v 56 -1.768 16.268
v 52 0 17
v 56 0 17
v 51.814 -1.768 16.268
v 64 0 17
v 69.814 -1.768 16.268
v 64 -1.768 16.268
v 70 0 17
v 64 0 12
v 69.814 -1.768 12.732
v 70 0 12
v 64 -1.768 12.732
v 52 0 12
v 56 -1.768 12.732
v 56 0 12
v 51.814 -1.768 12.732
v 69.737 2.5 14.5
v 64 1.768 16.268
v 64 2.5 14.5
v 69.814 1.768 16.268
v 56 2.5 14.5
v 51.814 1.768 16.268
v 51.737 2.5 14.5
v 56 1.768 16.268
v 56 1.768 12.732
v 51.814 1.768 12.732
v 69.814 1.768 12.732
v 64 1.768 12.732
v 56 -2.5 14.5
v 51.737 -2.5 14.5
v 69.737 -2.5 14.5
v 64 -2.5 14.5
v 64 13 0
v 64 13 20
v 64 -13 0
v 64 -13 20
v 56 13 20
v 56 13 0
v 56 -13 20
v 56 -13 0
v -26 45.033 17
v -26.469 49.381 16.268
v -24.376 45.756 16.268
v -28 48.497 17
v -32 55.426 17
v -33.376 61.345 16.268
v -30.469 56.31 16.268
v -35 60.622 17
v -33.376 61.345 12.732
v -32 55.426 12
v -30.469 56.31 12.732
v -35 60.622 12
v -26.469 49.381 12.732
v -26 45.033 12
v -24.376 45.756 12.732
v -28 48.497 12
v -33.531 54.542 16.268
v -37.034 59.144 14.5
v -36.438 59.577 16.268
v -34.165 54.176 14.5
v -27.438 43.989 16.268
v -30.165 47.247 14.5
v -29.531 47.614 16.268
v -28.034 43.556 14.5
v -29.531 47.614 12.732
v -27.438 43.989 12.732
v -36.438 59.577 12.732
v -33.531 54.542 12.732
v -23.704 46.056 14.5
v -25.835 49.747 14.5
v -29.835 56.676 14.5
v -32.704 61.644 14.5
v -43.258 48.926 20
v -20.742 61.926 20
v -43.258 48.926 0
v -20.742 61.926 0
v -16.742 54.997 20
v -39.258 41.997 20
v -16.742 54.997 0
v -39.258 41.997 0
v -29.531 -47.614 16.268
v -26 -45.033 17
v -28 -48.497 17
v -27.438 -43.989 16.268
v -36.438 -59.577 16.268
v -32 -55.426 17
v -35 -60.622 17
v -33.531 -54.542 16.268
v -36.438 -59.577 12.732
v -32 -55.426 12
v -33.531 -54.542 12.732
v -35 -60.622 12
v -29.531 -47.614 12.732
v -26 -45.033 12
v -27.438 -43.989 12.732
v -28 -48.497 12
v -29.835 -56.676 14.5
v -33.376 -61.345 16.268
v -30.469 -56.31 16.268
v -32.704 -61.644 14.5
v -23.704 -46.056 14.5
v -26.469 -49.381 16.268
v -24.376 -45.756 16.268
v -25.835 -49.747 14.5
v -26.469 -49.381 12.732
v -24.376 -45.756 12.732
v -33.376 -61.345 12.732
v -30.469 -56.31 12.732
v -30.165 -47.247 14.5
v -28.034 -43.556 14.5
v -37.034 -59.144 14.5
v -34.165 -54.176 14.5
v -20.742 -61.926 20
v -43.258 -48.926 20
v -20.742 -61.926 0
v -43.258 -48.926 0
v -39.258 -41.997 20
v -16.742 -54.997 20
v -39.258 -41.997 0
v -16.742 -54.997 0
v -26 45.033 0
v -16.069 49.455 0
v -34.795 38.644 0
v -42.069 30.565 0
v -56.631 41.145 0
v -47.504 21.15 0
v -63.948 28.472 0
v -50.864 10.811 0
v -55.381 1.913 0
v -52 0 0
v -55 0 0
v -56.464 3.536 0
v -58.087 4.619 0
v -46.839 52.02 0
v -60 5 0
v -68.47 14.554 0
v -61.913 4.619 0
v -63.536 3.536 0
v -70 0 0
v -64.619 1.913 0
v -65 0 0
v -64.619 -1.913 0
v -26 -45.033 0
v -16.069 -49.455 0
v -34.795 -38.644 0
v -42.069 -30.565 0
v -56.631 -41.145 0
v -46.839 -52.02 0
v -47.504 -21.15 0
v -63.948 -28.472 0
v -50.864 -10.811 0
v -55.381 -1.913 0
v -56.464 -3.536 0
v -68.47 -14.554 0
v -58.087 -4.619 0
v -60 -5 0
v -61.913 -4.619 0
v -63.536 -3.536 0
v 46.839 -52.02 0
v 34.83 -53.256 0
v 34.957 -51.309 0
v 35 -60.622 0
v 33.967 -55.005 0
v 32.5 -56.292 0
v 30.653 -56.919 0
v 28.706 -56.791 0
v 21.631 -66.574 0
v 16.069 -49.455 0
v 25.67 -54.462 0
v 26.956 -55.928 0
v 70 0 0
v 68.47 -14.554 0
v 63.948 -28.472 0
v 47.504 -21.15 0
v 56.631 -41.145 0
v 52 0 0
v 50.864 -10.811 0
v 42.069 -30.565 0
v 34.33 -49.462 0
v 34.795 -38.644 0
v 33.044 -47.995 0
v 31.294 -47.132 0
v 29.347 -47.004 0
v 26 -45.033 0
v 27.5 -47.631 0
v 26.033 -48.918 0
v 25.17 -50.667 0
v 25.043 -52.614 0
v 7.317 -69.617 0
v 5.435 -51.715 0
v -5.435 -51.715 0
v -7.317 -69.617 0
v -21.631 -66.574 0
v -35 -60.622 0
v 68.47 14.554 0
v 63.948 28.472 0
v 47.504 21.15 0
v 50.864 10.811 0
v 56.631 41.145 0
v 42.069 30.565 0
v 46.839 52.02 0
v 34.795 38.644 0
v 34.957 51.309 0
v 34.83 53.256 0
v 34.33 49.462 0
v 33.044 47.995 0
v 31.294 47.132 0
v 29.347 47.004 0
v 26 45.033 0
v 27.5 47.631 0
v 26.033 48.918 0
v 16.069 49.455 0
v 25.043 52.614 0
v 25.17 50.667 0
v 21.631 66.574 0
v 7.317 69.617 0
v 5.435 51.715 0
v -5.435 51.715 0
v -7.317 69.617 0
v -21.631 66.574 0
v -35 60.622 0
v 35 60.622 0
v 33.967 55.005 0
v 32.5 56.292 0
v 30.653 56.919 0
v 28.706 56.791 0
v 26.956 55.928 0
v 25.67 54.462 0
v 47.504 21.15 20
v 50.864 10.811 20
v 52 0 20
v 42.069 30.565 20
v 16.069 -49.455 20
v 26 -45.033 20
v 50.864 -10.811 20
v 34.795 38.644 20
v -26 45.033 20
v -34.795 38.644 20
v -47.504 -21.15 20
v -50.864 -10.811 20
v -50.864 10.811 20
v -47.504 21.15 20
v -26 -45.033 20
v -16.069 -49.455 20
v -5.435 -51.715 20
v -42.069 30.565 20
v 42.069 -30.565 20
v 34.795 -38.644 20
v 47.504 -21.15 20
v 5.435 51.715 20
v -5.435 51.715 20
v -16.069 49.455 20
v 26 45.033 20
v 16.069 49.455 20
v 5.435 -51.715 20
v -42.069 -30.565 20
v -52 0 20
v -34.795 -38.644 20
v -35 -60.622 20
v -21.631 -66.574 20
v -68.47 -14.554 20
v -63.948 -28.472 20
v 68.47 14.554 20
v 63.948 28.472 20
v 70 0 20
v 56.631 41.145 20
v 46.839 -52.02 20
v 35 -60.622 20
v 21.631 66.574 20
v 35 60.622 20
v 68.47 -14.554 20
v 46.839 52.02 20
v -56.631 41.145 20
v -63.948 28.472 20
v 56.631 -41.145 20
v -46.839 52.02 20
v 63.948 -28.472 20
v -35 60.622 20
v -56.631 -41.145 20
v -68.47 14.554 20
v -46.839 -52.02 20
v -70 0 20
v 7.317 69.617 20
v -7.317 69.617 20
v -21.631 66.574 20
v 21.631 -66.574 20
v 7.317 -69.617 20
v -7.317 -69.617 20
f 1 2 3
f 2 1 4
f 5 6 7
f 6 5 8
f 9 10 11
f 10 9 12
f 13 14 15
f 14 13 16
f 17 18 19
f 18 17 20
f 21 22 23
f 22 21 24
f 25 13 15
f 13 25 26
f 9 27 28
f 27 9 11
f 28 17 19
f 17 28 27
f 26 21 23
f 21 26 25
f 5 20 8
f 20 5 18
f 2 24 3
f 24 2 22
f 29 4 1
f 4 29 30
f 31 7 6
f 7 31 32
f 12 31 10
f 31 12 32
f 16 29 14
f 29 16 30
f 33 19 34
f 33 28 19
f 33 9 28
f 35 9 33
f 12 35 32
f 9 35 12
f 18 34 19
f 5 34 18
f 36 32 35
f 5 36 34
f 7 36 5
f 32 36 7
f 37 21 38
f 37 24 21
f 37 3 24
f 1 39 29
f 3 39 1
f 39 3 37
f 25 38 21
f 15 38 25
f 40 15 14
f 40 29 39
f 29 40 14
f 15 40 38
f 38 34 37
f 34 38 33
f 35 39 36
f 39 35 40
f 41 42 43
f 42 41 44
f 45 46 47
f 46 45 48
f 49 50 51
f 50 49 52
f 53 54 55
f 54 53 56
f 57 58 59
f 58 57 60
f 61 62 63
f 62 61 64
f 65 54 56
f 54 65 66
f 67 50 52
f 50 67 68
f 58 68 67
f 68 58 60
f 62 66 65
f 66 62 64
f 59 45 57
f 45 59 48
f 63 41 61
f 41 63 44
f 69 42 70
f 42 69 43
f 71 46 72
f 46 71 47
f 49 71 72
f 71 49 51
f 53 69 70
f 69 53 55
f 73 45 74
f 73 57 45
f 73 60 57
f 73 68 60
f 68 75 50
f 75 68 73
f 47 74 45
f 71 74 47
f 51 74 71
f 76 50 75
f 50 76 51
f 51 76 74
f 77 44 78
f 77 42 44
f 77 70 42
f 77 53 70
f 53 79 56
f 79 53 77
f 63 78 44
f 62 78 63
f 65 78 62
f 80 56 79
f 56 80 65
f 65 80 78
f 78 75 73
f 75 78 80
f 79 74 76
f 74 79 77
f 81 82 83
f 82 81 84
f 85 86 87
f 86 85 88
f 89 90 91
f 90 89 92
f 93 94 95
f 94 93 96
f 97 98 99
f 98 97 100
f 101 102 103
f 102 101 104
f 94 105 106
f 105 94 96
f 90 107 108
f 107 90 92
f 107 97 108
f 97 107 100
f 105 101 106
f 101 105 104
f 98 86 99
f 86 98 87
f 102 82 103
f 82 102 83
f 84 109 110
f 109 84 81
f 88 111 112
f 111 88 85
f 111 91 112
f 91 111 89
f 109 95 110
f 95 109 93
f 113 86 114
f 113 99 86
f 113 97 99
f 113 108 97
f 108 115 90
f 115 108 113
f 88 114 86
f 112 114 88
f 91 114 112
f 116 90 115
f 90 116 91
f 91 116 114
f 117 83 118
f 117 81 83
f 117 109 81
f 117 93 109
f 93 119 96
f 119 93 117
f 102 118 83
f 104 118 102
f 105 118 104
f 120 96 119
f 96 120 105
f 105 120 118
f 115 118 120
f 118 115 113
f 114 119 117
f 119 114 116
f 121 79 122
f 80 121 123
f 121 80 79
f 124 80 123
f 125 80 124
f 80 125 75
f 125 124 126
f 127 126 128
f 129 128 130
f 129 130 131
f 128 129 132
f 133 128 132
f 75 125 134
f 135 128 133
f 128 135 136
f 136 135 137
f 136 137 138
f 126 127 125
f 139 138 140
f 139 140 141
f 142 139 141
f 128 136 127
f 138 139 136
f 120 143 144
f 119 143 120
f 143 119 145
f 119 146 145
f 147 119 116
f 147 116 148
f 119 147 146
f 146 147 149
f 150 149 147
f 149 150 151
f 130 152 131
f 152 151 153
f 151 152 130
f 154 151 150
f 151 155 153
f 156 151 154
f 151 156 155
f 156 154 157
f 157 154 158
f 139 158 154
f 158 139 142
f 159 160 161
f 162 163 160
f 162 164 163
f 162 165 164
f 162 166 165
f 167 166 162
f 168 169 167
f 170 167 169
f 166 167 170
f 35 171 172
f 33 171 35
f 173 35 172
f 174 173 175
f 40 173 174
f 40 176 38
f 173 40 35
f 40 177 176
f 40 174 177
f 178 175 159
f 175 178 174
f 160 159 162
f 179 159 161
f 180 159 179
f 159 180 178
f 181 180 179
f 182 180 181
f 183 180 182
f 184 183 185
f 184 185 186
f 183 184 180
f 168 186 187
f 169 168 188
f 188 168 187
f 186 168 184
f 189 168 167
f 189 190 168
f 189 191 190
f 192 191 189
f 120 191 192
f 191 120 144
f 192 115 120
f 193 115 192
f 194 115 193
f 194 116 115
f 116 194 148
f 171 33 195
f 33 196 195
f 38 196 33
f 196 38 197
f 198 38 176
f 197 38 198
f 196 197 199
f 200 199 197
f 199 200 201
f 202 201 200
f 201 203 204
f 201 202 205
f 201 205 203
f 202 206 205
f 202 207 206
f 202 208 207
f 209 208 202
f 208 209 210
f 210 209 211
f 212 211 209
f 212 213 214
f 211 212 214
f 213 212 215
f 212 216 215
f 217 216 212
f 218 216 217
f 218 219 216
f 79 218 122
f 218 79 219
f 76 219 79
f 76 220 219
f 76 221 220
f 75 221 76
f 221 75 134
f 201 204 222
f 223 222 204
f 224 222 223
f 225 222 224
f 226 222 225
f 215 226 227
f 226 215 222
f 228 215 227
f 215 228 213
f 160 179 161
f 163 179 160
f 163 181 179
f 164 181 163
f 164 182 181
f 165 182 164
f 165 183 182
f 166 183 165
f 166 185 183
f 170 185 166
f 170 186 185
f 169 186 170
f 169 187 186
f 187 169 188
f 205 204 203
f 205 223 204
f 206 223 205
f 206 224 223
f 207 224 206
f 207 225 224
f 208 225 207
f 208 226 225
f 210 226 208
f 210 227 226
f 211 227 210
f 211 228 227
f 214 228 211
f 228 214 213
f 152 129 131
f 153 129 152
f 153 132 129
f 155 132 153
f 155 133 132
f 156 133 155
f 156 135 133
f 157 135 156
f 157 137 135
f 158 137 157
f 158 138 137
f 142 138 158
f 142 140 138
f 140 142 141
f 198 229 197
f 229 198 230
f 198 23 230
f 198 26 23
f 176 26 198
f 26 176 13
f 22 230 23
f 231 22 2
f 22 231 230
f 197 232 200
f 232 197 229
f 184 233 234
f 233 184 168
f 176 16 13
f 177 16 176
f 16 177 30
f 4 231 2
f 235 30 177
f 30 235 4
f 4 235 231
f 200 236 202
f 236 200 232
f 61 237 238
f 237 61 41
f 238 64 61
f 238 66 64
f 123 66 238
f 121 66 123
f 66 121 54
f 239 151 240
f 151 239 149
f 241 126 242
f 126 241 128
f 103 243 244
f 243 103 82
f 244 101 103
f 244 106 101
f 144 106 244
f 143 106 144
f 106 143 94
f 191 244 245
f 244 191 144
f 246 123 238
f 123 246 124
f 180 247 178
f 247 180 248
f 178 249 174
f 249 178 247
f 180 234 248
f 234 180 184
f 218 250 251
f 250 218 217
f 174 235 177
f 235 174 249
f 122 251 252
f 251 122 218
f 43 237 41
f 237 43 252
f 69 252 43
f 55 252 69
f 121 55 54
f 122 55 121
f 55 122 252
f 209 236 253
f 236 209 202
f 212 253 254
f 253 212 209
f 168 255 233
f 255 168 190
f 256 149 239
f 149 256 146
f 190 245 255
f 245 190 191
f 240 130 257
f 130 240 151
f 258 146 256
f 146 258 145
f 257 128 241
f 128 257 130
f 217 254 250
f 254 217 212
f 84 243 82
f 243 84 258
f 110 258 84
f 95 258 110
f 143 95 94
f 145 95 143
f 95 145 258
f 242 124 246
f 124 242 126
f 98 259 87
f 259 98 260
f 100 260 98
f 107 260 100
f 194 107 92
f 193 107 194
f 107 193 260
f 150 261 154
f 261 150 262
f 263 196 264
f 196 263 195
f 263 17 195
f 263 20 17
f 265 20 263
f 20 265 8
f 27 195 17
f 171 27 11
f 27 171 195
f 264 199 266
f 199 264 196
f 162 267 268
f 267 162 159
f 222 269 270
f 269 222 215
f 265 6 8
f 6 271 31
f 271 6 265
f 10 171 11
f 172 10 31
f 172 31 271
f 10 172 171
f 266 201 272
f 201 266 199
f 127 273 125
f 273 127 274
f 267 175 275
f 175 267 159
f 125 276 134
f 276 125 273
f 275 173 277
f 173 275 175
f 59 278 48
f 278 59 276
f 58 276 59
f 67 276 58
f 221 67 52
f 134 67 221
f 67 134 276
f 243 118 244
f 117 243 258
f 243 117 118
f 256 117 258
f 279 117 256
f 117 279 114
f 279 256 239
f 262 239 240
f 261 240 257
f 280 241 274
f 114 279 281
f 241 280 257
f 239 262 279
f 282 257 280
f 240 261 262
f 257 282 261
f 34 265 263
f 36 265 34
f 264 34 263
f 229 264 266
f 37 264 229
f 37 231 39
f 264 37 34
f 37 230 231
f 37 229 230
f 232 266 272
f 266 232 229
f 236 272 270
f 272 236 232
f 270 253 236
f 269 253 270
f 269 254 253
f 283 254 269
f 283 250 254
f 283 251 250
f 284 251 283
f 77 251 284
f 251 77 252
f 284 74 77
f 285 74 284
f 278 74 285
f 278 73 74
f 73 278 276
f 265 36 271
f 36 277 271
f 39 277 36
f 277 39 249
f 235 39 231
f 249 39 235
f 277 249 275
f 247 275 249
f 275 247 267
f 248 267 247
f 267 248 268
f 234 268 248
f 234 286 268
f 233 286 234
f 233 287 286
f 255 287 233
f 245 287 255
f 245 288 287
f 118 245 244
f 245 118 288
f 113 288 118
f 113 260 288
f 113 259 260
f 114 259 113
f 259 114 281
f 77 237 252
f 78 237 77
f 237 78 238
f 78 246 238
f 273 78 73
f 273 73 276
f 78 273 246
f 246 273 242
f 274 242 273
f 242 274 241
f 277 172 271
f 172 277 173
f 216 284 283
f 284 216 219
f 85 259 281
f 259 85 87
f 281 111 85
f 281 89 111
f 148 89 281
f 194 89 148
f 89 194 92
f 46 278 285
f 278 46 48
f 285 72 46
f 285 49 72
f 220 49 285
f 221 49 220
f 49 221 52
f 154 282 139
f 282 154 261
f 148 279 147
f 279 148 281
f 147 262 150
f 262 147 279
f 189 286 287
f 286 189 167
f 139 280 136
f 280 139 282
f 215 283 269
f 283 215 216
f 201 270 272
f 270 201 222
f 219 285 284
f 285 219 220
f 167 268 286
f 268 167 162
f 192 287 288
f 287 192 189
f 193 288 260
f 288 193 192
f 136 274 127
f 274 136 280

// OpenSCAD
// // some defaults for testing
// jogwheel_mid_rad = 70;
//
// spring_OD = 8;
// spring_len = 20;
// spring_comp_factor = 0.8;
//
// clearance = 1;



module jogwheel_mid(mid_params) {

    mid_outer_rad = mid_params[0];
    mid_width = mid_params[1];
    mid_height = mid_params[2];
    spring_params = mid_params[3];
    bearing_params = mid_params[4];
    clearances = mid_params[5];

    mid_inner_rad = mid_outer_rad - mid_width;

    spring_rad_offset = spring_params[0];
    spring_dims = spring_params[2];
    spring_comp_factor = spring_params[3];

    spring_OD = spring_dims[1];
    spring_len = spring_dims[2];

    inner_bear_rad_offset = bearing_params[2];
    inner_bear_vert_offset = bearing_params[3];
    bearing_dims = bearing_params[4];
    screw_length = bearing_params[5];
    bearing_shaft = bearing_dims[0];

    clearance = clearances[0];
    spring_diff = clearances[2];

    difference() {

        cylinder(r=mid_outer_rad, h=mid_height);        
        union() {
            // cutouts for bearings
            for (i = [0:2]) {
                rotate([0,0,i*120])
                    translate([inner_bear_rad_offset, 0, inner_bear_vert_offset])
                    union() {
                        rotate([0,90,0])
                            union() {
                                cylinder(d=bearing_shaft, h=screw_length, center=true);
                            }
                        cube([8,26,30], center=true);
                    }
            }

            //cutouts for springs
            for (i = [0:2]) {
                rotate([0,0,60+i*120])
                    translate([0, 0, -clearance]) 
                    translate([spring_rad_offset, 0, 0]) 
                    cylinder(d=spring_OD+2*clearance, h=spring_len*spring_comp_factor-spring_diff);
            }

            // cutout in centre
            translate([0,0,-clearance])
                cylinder(r=mid_inner_rad, h=mid_height+2*clearance);
        }
    }
            // for (i = [0:2]) {
            //     rotate([0,0,60+i*120])
            //         translate([0, 0, -clearance]) 
            //         translate([spring_rad_offset, 0, 0]) 
            //         cylinder(d=spring_OD+2*clearance, h=spring_len*spring_comp_factor);
            // }
}

// set up input params for test module

// mid_outer_rad = jogwheel_mid_rad;
// mid_width = 22;
// mid_height = 20;

// mid_params = [mid_outer_rad, mid_width, mid_height, spring_params, bearing_params, clearances];
mid_params = [70, 18, 20, [60,4.5,[6,8,20,0.8], 0.8], [91,16.5, 60, 14.5, [5,23,7], 21], [1,5]];

jogwheel_mid(mid_params);
